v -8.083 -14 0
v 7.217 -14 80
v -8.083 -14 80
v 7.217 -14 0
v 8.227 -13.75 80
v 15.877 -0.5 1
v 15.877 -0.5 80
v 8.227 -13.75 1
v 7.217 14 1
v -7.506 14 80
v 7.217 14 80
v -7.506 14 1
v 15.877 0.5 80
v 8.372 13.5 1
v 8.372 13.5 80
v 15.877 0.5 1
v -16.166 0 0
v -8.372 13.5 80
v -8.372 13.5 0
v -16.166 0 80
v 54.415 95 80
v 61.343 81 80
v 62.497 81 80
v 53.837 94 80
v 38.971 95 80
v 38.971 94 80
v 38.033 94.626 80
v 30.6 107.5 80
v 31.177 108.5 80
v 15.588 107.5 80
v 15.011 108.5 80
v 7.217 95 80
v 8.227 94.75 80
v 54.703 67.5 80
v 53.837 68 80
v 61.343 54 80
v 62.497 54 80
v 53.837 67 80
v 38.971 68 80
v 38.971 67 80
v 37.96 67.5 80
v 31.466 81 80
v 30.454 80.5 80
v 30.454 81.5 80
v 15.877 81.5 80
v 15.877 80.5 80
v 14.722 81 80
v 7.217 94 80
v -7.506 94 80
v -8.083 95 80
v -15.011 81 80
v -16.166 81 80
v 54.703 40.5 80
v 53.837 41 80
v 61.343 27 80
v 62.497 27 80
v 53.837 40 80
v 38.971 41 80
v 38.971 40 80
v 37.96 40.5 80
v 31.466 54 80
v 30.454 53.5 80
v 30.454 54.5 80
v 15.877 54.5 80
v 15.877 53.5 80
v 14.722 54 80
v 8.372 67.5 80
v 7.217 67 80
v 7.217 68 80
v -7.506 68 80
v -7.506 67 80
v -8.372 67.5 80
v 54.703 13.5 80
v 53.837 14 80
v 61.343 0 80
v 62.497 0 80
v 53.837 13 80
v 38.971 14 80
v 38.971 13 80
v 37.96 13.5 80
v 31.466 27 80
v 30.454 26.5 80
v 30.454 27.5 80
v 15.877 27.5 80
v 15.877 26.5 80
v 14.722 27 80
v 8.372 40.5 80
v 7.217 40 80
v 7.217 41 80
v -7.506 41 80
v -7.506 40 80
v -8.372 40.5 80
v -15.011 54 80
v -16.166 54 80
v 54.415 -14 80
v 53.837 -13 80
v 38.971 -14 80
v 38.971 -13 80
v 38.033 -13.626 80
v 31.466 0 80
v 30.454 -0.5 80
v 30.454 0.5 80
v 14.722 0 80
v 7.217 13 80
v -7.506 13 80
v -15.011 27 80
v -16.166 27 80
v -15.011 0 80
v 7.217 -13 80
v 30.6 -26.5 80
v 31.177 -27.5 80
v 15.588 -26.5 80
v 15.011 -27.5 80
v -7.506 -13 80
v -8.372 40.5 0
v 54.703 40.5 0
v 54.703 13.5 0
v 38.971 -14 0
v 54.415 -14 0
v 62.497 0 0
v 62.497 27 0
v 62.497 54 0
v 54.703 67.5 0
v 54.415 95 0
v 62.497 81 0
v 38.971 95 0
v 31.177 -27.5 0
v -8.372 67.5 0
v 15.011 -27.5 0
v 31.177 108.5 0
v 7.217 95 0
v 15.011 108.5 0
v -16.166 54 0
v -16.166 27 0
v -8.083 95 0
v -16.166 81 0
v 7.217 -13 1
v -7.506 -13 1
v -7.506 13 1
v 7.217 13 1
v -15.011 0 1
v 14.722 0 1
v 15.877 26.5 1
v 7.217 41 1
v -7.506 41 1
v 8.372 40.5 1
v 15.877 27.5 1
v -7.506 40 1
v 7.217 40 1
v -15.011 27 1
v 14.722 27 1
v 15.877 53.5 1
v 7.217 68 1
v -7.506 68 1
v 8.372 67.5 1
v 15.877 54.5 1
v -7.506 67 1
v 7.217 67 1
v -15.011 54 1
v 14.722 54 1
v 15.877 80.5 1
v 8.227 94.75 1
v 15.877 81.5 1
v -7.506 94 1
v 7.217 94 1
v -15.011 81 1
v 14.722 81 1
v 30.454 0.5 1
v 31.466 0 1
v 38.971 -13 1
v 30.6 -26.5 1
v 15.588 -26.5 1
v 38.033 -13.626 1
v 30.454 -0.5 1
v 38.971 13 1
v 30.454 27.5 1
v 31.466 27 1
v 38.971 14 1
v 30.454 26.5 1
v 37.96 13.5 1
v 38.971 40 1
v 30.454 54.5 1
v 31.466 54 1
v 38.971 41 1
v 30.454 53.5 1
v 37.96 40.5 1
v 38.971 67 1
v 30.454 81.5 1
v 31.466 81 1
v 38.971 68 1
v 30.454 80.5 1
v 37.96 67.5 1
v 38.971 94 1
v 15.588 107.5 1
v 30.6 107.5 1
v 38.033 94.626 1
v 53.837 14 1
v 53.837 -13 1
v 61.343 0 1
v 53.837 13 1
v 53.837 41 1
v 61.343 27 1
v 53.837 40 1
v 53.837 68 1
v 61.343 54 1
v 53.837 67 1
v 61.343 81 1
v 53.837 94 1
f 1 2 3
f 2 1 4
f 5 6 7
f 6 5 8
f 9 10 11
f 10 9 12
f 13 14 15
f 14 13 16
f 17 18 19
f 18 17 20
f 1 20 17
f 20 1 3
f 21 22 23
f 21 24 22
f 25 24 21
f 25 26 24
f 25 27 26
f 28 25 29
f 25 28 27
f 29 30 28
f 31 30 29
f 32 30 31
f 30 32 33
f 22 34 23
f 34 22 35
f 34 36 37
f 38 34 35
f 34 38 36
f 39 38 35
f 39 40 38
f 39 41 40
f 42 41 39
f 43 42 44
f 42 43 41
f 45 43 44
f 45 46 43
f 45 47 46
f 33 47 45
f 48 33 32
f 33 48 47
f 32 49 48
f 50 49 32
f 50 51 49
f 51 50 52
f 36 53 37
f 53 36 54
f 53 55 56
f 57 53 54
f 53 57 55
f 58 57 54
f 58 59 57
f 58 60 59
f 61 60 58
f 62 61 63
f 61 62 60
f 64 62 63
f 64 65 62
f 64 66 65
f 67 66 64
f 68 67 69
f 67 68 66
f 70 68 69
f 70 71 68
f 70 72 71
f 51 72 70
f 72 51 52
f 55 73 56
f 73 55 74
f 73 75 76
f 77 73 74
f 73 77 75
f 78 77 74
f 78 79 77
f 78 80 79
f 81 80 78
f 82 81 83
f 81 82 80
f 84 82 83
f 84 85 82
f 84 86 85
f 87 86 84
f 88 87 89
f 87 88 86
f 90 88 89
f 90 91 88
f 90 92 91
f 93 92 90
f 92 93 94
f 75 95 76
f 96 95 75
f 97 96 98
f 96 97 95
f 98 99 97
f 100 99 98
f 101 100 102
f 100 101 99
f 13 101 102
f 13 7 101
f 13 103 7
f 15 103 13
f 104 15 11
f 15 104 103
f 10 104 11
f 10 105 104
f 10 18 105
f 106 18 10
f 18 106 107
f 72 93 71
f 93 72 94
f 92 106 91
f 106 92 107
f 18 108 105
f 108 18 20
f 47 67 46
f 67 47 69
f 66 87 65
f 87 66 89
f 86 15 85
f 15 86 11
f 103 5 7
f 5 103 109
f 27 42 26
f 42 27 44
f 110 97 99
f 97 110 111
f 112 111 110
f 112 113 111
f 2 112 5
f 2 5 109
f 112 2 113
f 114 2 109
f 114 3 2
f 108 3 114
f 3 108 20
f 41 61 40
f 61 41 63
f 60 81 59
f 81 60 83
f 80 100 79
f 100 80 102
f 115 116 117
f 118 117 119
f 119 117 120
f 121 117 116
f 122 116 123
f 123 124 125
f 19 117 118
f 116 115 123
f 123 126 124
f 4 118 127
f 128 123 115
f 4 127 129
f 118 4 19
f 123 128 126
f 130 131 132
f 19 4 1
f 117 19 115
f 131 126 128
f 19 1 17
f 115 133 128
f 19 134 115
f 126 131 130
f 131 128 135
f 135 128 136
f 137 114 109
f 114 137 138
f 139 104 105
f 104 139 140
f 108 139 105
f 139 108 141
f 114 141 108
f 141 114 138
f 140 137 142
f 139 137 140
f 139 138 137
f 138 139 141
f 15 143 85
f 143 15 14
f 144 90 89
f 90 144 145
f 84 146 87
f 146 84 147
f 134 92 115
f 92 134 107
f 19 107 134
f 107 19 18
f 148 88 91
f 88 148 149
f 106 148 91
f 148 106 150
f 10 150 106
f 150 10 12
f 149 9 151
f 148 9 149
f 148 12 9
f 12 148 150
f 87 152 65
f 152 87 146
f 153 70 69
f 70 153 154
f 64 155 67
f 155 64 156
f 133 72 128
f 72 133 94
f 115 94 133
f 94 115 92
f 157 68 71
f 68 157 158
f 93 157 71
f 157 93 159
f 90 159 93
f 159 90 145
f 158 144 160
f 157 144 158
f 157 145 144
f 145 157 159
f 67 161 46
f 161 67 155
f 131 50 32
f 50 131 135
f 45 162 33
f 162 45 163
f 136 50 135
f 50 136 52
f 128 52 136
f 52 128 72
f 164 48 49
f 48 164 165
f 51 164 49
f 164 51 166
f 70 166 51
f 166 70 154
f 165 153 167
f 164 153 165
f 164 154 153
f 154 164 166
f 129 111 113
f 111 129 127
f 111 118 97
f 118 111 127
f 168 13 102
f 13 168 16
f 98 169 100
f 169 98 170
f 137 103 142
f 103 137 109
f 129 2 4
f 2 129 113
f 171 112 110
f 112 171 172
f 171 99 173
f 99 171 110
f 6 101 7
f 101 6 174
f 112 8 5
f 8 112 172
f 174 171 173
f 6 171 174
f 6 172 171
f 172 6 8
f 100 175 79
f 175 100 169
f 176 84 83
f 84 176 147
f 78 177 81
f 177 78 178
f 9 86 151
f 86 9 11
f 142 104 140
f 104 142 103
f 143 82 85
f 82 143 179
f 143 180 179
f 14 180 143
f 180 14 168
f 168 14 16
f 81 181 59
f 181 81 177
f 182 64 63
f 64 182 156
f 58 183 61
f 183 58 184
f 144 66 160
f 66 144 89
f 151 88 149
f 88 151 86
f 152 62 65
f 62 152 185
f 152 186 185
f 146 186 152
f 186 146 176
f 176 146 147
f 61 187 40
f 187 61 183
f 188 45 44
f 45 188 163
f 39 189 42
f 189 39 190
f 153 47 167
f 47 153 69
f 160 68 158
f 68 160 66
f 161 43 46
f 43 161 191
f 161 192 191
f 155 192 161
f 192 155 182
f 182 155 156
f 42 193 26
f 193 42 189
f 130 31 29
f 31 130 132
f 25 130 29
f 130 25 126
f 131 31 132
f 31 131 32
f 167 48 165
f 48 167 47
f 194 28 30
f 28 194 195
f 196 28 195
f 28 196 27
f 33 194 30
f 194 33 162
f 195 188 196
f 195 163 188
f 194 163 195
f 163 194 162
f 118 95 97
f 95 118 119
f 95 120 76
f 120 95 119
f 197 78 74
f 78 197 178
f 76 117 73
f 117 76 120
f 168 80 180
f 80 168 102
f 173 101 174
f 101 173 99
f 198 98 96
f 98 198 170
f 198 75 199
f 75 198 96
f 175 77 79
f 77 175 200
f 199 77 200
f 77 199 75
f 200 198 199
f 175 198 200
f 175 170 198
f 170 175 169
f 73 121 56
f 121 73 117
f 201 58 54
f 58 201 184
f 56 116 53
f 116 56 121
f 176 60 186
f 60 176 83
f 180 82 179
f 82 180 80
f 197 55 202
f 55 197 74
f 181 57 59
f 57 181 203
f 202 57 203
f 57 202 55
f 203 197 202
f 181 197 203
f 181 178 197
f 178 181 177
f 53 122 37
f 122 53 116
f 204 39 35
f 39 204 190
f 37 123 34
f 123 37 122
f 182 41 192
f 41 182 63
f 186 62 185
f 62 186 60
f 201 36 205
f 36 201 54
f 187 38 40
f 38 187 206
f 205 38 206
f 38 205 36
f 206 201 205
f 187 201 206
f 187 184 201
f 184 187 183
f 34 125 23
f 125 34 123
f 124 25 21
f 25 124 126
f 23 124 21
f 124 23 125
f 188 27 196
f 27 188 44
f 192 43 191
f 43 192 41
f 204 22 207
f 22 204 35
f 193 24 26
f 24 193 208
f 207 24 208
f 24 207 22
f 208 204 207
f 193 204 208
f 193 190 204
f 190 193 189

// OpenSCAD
// external radius of base hexagon
w = 28;
// height of base hexagon
h = 80;
// base thickness
baseThickness = 1;
// border thickness
thickness = 1;

// number of hexagon on a horizontal row
xRow = 4;
// number of hexagon on a vertical row
yRow = 3;

// if true evry 2nd row had an additional hexagon so that the grid is simmetric
middleLineAddOne = true;

r = w / 2 / cos(30);
tt = thickness / cos(30);

module hexagon() {
  difference() {
    cylinder(r=r, h=h, $fn=6);
    translate([0,0,baseThickness]) {
      cylinder(r=r-tt, h=h, $fn=6);
    }
  }
}

for(j =[0:1:yRow-1]){
  if(j % 2 == 0){
    for(i =[0:1:xRow-1]){
      translate([r*j+w/4*j,(w-thickness)*i,0]){
        hexagon();
      }
    }
  } else {
    for(i =[(middleLineAddOne?-1:0):1:xRow-1]){
      translate([(3*r/2-tt)*j, (w-thickness)/2+(w-thickness)*i,0]){
        hexagon();
      }
    }
  }
}
